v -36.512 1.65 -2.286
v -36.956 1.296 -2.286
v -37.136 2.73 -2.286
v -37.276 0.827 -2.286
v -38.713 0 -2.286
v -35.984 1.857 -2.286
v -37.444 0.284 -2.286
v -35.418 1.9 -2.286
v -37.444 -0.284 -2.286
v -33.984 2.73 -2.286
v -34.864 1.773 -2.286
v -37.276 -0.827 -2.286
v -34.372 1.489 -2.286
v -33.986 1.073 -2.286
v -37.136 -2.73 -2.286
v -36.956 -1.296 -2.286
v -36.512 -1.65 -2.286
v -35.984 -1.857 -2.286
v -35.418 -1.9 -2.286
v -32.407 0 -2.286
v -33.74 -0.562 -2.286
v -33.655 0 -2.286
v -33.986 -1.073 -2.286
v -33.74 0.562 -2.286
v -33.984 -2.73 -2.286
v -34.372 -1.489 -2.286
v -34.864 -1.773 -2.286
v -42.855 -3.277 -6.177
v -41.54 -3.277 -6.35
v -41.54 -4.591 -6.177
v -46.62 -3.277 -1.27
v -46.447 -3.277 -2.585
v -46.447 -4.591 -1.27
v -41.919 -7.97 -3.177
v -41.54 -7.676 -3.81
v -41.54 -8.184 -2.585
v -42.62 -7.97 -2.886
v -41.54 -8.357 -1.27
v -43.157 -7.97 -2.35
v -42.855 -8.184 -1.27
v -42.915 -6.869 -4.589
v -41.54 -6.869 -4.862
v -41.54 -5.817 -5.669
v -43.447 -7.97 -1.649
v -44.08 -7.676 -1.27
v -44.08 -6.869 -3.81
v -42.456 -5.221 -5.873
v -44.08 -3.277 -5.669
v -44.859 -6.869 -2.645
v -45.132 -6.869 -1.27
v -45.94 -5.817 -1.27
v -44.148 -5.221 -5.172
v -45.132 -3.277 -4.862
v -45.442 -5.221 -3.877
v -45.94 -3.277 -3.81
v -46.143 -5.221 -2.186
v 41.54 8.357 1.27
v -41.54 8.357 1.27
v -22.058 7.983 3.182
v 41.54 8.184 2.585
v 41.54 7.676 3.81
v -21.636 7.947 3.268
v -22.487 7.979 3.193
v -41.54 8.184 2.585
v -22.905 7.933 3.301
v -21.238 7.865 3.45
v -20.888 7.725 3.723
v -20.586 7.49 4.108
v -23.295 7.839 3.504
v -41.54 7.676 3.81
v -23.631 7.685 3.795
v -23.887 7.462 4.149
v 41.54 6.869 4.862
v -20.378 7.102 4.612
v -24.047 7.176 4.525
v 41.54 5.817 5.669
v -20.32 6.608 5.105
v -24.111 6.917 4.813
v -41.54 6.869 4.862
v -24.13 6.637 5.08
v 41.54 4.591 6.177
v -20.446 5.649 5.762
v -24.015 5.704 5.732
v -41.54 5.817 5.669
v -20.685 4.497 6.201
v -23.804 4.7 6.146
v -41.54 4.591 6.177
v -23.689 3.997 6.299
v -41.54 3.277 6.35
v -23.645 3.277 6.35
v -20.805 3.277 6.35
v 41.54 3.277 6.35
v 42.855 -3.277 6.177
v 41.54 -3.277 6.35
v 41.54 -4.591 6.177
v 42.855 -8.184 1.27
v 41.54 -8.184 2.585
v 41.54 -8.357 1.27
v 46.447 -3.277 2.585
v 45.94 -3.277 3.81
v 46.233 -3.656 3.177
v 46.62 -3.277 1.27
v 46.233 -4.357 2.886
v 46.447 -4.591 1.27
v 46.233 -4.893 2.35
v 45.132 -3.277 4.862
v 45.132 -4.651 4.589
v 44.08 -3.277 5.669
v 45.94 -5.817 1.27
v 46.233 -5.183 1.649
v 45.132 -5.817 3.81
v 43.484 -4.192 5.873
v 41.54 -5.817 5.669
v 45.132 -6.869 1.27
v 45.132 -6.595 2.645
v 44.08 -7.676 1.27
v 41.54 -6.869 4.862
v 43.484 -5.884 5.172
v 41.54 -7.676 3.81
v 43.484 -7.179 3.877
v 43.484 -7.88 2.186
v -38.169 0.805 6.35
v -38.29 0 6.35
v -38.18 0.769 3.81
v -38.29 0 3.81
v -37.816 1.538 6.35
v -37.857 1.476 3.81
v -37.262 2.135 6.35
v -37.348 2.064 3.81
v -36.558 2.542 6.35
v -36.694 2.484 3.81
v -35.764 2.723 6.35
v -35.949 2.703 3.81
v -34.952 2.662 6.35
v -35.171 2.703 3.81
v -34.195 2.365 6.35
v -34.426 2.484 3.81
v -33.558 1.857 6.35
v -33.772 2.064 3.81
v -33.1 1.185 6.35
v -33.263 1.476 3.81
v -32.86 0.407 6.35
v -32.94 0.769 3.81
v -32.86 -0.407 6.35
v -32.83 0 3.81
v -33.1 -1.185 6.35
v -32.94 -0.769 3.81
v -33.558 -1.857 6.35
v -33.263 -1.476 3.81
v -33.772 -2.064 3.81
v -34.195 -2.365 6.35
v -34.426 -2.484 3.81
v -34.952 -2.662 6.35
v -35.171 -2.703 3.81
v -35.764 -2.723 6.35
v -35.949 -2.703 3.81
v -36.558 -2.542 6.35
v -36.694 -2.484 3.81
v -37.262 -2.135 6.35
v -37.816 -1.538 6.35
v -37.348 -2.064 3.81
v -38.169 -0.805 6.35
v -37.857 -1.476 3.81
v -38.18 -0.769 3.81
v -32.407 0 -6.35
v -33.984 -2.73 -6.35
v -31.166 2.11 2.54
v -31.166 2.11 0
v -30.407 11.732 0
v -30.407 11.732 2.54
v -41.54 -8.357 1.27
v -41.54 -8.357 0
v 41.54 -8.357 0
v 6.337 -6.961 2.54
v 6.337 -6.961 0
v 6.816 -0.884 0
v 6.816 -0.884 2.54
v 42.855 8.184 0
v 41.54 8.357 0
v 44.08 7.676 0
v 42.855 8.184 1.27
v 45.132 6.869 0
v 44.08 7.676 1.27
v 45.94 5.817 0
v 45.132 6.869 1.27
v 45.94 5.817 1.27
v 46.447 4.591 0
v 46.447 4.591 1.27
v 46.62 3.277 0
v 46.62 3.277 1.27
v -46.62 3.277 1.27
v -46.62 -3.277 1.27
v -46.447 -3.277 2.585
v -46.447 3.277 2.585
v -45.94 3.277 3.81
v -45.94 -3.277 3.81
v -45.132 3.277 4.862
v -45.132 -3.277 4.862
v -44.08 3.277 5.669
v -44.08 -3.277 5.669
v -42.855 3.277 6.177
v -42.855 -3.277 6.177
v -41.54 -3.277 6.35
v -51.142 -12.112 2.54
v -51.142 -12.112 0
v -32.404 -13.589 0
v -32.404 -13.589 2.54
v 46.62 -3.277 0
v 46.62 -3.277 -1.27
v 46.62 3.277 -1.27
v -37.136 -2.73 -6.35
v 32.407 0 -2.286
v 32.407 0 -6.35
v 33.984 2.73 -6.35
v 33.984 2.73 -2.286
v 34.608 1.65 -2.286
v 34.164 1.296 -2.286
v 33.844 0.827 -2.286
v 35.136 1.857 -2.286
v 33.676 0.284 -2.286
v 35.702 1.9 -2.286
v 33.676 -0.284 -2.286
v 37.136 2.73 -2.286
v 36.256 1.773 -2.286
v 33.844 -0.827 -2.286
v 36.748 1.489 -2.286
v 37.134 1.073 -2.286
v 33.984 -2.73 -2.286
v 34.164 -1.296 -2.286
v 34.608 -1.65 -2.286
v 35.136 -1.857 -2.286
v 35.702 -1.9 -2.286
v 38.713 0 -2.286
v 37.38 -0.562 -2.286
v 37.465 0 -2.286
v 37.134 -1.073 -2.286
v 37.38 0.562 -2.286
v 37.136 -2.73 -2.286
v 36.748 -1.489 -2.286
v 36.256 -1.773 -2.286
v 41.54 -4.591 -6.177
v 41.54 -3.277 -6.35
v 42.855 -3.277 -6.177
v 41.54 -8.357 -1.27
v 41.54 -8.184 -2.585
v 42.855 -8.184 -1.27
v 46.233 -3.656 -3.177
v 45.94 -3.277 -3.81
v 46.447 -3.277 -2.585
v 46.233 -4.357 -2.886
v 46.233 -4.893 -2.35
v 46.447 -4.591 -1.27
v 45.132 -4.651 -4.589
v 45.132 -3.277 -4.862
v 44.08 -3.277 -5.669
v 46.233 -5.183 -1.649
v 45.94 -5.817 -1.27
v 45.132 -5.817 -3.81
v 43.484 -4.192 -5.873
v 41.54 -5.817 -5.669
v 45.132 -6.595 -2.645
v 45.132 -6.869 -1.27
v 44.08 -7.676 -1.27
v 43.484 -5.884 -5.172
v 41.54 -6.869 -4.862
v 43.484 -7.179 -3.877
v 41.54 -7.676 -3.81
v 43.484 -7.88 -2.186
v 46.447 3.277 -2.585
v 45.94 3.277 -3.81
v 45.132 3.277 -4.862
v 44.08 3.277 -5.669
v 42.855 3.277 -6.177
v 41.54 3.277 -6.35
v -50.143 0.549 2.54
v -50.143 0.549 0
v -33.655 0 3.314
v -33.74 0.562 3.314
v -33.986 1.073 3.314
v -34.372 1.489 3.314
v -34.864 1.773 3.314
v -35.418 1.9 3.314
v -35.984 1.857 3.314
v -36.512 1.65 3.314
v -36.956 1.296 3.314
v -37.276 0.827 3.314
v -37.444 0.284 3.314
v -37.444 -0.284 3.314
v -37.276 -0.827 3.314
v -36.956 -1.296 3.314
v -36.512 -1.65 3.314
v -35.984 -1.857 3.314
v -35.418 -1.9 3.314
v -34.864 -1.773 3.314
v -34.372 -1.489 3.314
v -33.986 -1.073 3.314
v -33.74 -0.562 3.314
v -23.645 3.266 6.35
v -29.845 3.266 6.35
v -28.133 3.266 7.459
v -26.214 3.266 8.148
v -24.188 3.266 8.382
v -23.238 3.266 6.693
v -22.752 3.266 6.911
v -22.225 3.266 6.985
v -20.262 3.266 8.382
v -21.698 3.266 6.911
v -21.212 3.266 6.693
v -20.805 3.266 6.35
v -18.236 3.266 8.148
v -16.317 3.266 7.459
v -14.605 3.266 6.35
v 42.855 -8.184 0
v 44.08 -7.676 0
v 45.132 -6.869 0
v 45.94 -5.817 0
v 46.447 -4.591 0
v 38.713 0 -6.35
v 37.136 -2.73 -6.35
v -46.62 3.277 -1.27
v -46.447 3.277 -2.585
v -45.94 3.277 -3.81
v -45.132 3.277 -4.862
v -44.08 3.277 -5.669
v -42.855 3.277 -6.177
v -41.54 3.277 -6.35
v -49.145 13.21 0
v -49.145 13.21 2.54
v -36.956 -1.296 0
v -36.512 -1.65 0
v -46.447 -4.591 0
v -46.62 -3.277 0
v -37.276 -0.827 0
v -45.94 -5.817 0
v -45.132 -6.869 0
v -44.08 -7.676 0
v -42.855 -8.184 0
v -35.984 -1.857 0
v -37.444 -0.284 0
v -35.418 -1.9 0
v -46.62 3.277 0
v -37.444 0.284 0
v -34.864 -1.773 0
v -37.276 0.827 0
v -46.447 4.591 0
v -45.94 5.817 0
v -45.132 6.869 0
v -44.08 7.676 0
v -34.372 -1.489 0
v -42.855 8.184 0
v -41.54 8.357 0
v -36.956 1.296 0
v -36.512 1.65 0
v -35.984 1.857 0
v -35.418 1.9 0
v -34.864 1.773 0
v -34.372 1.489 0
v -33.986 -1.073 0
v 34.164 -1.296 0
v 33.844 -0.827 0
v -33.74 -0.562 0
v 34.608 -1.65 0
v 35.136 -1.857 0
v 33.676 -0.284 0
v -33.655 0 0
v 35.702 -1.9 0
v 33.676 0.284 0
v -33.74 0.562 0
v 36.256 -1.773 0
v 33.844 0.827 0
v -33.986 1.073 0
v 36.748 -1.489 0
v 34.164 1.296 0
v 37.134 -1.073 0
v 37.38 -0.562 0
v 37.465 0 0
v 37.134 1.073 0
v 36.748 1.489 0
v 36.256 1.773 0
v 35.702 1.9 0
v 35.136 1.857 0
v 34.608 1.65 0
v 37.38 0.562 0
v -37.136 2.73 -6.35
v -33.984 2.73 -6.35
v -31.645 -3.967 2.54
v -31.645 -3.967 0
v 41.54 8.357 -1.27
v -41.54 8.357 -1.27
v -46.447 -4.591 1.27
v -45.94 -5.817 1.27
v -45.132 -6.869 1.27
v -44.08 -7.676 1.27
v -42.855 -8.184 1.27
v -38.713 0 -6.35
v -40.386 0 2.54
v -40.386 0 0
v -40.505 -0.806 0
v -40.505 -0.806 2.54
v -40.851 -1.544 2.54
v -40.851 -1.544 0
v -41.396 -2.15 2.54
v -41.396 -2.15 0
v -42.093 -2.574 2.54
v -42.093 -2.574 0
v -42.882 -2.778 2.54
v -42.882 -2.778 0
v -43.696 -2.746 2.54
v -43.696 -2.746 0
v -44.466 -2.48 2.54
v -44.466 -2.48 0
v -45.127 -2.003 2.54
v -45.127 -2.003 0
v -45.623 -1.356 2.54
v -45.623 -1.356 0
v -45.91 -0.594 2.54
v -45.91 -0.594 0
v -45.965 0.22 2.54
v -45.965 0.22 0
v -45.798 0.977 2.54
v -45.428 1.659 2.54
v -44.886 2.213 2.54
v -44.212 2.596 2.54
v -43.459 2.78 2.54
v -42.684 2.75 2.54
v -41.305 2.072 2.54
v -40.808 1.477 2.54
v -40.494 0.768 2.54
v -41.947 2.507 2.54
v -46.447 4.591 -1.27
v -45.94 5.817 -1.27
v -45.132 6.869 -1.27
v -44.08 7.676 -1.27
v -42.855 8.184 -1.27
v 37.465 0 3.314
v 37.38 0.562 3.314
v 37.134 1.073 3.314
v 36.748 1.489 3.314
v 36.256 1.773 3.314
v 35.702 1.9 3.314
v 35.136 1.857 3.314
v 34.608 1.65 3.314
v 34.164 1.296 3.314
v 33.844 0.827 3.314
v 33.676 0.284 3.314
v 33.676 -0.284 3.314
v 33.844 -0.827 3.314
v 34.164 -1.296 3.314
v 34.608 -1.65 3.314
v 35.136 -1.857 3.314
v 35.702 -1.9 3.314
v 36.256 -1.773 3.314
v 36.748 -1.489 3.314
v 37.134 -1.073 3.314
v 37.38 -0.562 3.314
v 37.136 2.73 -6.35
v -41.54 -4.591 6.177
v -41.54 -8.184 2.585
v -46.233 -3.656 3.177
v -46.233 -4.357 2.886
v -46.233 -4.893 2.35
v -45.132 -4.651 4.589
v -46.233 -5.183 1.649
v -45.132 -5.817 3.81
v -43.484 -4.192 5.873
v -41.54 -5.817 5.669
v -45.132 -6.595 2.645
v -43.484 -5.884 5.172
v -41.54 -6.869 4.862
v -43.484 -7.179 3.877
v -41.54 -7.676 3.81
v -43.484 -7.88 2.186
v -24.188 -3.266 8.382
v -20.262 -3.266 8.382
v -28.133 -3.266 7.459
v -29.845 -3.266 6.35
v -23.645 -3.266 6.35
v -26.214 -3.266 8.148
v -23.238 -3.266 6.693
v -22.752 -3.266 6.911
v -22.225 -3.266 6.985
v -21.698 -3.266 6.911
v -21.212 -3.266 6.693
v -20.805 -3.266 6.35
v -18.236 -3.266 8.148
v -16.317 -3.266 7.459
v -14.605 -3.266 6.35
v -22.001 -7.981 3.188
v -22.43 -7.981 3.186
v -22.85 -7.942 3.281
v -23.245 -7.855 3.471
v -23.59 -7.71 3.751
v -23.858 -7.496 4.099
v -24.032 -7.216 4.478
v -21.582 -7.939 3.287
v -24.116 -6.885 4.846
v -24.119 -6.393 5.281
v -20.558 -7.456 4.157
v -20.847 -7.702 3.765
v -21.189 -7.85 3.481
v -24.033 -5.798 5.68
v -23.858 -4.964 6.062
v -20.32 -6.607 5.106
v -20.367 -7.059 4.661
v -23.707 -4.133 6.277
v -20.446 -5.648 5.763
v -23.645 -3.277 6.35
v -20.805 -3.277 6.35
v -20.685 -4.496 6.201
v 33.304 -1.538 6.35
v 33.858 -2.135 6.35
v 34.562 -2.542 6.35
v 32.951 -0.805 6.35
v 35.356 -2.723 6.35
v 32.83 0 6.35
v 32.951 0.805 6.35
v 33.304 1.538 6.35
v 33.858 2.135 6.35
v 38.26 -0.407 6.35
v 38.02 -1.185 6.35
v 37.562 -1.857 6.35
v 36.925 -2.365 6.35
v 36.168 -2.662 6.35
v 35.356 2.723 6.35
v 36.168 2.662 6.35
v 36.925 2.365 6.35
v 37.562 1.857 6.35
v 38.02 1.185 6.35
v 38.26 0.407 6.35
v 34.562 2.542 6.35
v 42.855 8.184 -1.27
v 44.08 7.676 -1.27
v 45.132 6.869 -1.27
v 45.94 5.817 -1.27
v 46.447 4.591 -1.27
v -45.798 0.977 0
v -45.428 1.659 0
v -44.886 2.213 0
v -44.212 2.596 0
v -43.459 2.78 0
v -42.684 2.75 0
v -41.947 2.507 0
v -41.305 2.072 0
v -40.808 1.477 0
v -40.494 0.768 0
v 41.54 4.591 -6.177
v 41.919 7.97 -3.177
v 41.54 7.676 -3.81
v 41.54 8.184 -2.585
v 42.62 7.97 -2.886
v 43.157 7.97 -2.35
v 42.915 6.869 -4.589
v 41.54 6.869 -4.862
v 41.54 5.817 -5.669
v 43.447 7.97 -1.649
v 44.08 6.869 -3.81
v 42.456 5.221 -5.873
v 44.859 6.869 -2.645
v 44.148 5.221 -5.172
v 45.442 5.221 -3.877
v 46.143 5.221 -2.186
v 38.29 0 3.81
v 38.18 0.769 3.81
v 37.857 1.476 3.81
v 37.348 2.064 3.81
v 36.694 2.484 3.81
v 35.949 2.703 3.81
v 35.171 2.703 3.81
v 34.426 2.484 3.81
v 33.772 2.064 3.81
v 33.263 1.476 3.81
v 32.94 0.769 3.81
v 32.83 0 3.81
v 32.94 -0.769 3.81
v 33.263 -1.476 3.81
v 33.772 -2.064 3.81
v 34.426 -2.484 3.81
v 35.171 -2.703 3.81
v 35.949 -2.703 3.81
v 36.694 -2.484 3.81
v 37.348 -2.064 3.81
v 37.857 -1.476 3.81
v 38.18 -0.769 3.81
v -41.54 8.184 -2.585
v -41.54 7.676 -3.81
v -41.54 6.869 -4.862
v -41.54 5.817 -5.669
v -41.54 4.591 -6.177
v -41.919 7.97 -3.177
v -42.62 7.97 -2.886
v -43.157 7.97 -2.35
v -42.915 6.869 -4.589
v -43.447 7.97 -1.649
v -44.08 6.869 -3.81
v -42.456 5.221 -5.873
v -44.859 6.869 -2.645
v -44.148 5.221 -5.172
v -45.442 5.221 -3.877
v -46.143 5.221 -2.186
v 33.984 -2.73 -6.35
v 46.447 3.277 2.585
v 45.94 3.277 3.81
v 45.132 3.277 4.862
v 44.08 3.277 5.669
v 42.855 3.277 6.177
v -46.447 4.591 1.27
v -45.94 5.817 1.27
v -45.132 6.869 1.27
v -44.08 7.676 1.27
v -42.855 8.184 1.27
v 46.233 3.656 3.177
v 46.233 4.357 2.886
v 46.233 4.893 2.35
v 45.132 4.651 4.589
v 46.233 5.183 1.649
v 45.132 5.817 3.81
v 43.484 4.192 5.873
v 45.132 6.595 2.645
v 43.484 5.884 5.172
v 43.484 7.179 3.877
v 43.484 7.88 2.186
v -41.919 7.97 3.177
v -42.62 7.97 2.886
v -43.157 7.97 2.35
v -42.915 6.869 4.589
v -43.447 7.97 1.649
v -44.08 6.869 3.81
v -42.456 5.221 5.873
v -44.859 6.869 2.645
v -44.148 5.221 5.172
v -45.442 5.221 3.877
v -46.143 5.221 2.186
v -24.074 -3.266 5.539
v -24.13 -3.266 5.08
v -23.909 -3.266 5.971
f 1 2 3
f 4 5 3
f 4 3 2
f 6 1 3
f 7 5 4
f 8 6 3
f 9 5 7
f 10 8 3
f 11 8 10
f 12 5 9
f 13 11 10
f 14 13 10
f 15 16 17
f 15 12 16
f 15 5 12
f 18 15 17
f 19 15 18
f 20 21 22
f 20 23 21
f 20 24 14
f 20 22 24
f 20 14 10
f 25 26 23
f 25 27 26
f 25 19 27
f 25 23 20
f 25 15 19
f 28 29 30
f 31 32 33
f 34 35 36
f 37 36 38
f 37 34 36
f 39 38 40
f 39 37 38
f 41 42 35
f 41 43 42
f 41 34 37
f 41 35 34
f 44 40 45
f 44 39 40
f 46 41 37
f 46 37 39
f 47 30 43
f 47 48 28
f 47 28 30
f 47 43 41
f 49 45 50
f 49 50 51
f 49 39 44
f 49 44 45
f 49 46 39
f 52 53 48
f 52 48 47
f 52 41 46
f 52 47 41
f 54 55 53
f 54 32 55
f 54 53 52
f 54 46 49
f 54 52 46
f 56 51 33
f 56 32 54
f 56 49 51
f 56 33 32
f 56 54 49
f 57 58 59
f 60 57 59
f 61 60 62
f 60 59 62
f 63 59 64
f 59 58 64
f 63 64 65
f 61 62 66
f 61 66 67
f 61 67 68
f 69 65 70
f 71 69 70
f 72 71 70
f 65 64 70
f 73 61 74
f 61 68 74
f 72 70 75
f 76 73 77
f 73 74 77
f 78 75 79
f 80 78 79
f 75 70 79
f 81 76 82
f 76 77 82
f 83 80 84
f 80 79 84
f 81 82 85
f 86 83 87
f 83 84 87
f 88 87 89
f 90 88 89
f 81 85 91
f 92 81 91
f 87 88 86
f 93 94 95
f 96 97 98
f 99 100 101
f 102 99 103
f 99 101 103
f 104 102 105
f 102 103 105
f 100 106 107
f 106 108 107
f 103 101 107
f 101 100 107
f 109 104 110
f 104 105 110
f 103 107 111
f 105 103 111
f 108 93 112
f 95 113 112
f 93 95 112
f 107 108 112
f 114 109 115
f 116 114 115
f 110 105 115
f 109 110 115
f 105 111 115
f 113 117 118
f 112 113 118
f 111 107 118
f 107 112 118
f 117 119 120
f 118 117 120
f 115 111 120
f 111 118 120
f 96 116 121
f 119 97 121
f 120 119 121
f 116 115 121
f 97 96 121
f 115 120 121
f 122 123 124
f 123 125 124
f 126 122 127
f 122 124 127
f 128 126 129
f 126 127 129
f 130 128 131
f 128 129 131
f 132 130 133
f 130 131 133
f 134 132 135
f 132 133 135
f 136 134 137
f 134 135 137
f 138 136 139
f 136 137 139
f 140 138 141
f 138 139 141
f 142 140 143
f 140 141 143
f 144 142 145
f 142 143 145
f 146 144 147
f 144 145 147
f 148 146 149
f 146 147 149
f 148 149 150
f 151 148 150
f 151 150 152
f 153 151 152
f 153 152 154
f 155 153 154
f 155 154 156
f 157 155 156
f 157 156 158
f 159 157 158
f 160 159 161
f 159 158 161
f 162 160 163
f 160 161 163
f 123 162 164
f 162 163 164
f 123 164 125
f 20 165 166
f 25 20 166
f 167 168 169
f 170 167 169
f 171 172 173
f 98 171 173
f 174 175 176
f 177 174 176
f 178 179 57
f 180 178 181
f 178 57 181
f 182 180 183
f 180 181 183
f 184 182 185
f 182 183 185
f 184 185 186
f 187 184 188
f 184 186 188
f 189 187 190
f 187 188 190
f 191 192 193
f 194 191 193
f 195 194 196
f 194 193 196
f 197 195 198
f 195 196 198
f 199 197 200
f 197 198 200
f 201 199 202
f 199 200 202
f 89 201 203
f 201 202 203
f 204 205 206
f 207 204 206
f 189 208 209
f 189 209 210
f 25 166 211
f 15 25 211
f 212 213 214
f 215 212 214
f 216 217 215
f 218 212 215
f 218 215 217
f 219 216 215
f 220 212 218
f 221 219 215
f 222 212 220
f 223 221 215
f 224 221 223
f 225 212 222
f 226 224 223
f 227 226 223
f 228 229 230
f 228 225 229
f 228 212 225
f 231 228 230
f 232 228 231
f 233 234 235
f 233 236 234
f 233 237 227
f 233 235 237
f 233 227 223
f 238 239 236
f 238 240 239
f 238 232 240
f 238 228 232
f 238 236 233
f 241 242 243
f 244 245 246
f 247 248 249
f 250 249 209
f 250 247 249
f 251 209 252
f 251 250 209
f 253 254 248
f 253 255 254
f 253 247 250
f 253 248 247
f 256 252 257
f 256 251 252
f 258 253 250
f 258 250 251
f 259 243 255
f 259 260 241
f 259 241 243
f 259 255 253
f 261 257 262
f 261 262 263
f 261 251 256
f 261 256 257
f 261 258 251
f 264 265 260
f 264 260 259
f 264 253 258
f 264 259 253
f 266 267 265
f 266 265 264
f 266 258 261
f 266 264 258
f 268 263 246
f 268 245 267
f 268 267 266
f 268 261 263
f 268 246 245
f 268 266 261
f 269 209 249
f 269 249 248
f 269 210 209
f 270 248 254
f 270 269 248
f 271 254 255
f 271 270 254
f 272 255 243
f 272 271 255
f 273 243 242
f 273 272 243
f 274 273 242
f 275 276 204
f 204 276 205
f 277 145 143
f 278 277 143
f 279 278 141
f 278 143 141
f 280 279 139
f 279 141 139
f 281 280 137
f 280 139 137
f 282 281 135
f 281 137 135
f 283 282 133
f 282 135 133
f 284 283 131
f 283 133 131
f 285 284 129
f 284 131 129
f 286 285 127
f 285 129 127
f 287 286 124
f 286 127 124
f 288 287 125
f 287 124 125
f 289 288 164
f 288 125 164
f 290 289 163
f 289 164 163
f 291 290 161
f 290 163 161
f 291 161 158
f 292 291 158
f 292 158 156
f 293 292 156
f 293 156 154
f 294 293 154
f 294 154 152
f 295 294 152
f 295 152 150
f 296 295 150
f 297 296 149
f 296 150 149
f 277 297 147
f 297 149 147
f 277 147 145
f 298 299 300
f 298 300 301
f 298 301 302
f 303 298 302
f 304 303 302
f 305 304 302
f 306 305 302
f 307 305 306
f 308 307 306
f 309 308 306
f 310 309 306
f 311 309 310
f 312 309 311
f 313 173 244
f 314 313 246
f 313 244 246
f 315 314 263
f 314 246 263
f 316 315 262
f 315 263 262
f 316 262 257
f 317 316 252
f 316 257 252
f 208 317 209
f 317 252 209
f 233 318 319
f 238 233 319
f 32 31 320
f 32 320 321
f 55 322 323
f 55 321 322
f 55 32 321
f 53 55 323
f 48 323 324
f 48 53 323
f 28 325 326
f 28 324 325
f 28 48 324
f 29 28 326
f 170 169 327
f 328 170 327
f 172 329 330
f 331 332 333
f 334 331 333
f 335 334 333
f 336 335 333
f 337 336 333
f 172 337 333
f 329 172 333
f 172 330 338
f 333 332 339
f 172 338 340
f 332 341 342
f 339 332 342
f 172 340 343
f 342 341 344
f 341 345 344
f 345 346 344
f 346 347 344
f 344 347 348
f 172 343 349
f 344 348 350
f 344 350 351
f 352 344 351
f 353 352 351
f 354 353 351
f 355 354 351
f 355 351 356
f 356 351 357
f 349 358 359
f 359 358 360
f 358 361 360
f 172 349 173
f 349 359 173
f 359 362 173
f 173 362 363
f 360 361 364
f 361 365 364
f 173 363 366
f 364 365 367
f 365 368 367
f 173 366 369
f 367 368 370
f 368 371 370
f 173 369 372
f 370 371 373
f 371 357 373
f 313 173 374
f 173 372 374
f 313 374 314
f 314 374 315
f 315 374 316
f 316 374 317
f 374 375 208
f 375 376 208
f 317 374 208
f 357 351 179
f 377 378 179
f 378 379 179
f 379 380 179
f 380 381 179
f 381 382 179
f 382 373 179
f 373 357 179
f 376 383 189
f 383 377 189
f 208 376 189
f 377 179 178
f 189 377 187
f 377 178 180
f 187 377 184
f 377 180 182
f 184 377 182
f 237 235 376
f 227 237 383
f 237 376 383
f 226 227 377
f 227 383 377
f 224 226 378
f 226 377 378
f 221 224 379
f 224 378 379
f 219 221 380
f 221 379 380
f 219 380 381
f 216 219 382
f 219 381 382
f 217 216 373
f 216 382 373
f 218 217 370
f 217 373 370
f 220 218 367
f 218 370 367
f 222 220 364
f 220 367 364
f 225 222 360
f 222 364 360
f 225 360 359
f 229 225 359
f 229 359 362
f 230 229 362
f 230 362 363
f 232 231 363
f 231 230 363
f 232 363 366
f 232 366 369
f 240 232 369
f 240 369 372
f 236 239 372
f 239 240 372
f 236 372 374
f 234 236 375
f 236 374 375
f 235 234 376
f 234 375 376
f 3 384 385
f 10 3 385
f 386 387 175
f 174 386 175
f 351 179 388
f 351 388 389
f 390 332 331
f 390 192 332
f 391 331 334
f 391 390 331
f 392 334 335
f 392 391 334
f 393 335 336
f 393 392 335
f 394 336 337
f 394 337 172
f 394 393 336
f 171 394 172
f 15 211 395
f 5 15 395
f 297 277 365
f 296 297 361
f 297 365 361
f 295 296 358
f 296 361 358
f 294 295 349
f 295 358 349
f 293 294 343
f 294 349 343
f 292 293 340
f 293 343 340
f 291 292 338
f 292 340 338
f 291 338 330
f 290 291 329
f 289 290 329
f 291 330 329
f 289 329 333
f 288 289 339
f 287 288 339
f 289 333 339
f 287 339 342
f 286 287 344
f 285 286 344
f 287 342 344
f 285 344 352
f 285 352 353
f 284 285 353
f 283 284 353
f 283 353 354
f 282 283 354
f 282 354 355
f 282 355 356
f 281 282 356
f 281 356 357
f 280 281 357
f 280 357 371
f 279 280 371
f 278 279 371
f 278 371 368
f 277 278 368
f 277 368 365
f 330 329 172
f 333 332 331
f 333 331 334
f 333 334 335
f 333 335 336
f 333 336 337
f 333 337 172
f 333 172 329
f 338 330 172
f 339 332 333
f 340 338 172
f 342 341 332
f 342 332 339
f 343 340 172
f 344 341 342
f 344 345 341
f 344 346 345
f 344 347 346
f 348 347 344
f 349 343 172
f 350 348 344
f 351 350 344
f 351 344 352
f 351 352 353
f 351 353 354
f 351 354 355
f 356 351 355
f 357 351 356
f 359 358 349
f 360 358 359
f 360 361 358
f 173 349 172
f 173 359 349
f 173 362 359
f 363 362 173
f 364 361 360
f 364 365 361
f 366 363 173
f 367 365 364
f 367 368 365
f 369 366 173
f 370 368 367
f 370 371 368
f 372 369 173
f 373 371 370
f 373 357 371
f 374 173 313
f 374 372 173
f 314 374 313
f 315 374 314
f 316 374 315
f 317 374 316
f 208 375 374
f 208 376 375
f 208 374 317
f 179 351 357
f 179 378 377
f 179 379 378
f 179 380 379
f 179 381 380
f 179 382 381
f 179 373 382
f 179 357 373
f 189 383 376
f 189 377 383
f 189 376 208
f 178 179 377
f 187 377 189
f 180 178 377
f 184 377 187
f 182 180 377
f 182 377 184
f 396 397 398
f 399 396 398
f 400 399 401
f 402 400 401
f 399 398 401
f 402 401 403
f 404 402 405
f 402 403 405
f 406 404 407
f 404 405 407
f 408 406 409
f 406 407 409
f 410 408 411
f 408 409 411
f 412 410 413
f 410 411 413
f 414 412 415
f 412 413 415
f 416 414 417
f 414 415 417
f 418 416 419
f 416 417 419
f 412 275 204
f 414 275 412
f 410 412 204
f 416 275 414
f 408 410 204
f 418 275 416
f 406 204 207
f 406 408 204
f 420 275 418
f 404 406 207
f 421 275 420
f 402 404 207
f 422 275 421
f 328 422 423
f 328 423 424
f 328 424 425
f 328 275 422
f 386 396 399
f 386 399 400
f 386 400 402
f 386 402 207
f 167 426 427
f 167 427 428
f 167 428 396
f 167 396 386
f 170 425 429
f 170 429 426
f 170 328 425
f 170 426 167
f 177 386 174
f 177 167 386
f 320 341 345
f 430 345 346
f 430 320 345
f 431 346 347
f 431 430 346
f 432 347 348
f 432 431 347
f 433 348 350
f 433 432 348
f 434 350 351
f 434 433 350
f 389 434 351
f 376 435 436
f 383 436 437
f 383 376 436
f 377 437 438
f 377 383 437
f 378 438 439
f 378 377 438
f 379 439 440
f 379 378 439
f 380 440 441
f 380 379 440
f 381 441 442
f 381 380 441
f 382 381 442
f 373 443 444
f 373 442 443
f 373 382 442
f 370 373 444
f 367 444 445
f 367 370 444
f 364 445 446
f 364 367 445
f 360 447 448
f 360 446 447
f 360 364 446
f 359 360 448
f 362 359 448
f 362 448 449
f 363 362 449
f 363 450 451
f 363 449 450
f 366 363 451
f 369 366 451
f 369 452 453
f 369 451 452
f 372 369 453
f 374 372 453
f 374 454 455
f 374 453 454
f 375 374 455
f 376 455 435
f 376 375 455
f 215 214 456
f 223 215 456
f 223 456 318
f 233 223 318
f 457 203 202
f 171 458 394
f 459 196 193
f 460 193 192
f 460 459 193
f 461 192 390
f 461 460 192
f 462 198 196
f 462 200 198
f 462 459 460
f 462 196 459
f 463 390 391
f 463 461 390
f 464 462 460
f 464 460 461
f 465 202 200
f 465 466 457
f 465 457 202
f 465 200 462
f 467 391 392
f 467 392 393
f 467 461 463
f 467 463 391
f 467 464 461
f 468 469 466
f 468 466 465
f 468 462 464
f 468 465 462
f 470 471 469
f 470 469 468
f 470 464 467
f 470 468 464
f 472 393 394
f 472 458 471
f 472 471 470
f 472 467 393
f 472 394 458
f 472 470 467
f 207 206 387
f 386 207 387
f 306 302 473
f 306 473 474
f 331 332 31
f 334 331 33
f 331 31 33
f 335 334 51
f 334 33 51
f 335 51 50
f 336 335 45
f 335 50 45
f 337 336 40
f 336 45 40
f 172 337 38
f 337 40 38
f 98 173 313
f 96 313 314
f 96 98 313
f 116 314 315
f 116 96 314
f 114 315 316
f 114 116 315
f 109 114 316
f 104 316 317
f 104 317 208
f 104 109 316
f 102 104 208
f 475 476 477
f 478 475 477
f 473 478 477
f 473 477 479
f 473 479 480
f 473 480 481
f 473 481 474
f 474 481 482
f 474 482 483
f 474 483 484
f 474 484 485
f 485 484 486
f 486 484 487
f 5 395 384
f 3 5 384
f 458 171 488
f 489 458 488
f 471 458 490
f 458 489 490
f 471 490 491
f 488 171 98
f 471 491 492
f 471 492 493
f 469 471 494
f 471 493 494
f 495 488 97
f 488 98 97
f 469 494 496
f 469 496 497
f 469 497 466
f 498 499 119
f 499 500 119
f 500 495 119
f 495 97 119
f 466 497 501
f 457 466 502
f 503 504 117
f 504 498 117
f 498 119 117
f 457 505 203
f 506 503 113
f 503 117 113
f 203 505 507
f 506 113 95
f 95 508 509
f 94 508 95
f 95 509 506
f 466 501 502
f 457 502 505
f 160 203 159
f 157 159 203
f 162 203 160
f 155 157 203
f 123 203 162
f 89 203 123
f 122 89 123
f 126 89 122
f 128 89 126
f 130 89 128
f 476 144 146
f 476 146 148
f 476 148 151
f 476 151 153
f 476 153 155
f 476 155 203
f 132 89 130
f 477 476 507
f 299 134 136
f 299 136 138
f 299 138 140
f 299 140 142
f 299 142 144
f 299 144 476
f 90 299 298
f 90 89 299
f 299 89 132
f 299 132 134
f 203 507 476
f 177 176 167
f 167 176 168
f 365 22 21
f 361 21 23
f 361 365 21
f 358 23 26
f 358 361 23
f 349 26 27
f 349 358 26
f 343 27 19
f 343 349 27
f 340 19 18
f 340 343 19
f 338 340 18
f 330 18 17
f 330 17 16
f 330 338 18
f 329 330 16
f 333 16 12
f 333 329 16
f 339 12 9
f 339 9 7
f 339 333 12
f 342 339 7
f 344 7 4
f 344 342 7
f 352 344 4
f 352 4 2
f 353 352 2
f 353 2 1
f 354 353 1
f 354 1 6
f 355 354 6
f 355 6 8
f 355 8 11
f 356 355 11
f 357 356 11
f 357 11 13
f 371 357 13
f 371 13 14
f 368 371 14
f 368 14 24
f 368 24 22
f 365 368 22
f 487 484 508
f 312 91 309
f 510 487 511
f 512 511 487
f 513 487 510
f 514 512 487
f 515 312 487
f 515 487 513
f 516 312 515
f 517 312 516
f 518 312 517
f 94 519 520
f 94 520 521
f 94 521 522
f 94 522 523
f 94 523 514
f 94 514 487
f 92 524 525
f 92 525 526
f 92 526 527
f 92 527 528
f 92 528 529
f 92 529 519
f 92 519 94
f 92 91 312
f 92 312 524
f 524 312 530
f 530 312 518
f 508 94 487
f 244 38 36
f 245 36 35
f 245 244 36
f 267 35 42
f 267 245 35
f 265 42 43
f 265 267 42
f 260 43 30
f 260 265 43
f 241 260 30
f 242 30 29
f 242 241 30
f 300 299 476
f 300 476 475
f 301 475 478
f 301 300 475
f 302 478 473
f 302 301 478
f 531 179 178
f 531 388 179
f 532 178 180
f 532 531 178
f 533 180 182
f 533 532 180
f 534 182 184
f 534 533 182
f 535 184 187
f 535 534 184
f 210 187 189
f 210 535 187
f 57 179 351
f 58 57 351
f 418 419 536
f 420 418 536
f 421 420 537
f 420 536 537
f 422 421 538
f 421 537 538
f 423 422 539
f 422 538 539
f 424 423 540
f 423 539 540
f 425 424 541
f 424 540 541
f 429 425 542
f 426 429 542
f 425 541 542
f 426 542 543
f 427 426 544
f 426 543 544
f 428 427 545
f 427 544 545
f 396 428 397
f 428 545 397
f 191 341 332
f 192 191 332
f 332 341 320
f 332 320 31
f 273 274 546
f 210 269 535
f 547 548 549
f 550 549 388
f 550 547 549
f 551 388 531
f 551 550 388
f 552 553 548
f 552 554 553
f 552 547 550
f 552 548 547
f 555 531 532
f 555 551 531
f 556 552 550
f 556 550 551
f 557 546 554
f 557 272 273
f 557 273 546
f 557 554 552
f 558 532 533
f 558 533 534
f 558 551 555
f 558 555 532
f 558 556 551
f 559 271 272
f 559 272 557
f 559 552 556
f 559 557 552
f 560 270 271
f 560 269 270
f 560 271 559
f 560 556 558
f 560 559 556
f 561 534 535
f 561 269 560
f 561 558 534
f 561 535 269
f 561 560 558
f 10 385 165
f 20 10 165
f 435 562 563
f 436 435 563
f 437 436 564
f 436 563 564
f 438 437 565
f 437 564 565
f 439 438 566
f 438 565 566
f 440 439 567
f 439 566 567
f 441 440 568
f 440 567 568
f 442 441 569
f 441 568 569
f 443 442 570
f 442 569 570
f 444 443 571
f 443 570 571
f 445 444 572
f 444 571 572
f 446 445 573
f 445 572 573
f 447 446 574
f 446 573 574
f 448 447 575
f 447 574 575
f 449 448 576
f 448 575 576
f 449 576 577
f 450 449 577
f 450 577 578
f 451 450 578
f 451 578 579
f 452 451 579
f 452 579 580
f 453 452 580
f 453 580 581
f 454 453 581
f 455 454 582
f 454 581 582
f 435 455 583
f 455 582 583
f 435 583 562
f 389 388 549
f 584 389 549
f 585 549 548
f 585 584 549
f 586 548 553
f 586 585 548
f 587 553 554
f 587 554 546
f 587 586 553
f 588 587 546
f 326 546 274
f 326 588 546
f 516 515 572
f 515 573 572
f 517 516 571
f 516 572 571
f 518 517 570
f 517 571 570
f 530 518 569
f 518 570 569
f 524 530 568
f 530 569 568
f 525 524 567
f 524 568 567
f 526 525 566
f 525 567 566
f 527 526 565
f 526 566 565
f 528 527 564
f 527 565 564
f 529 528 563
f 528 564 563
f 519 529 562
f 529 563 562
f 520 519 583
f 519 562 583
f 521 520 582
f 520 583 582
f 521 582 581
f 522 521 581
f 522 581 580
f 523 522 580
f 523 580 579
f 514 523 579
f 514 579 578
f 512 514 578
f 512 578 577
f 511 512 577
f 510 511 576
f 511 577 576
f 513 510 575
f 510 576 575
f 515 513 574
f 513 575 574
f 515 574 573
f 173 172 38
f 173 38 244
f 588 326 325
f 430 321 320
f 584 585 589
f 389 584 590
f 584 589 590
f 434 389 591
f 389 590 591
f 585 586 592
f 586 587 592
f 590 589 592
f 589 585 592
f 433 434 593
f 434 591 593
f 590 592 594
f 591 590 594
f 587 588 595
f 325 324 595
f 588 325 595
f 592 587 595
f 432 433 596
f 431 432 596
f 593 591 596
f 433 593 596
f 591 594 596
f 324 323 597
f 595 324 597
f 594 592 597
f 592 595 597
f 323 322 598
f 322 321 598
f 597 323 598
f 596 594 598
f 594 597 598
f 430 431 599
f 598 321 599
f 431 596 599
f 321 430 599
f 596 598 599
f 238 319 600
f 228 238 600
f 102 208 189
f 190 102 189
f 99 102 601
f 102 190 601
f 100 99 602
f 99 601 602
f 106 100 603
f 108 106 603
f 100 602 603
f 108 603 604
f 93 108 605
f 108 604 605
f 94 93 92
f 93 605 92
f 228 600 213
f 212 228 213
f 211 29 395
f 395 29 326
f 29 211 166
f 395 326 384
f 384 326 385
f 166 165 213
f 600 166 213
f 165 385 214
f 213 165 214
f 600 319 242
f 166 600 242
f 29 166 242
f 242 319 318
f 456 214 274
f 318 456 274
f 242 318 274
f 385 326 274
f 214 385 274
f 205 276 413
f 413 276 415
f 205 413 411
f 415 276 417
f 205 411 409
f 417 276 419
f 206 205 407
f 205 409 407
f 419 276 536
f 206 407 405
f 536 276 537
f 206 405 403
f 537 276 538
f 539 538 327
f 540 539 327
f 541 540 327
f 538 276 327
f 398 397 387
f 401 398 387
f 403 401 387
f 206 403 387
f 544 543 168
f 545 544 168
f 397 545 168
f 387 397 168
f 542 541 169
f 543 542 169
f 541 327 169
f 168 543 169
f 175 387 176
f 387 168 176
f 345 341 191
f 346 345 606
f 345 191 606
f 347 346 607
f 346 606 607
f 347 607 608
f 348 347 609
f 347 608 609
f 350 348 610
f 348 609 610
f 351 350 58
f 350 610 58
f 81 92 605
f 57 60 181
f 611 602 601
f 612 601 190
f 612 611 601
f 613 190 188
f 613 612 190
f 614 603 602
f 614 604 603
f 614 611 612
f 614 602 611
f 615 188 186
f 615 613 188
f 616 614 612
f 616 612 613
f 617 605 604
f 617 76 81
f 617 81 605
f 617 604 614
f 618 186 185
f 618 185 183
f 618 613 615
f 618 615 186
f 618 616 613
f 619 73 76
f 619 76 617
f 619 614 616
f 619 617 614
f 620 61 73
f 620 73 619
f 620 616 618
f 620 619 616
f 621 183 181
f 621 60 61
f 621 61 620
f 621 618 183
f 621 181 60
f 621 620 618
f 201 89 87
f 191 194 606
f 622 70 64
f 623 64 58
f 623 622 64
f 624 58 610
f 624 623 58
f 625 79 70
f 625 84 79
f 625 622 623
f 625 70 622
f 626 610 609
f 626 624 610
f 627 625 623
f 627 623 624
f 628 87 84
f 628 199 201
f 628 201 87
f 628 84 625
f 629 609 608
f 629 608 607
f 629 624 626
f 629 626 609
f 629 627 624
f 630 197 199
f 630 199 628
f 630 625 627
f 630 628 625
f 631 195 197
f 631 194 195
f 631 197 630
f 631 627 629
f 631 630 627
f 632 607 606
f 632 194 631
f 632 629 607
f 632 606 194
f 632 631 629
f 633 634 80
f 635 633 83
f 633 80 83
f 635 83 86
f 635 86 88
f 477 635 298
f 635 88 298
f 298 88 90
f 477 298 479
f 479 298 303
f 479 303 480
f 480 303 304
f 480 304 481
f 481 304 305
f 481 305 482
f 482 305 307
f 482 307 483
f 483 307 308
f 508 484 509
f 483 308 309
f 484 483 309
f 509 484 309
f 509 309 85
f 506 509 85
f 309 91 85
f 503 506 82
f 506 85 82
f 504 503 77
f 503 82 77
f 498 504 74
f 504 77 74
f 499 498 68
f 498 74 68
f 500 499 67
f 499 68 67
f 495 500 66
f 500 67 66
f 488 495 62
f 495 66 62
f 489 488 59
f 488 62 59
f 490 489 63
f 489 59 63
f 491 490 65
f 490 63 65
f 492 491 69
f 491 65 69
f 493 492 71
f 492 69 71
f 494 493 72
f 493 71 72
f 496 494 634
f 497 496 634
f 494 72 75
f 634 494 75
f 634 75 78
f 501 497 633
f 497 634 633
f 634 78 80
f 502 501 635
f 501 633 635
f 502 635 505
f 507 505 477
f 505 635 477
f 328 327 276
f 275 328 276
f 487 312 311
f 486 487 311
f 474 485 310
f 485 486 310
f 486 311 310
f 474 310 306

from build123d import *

# Parameters (mm, degrees)
F1_DEPTH    = 2.54
F2_R        = 1.905
F3_DEPTH    = 6.35
F4_DEPTH    = 6.35
F5_R        = 5.08
F6_R        = 5.08
F7_W        = 15.24
F7_H        = 6.5325613847
F8_DEPTH    = 2.032
F9_T1_DEPTH = 34.8168043479
F11_D       = 3.81
F11_DEPTH   = 5.0913193076
F12_D       = 3.81
F14_D       = 5.461
F14_DEPTH   = 2.54
F14_TIP     = 1.6406499203
F15_R       = 1.905
F16_DEPTH   = 4.064


# Not quite as in the source:
# - a fillet or chamfer that OpenCascade refuses, or shapes differently, is made with other operations: its cross-section is extruded or revolved along the edge and cut away or added
# - a feature of the source that left no trace in its solid (it failed there, or was rolled back) is left out


with BuildPart() as f1:
    # F0 (on Top) → F1 (new body)
    with BuildSketch(Plane.XY):
        Polygon((-30.4073522295, 11.7323991549), (-49.1452058091, 13.2097140262), (-50.143391533, 0.5490021481), (-51.1415772568, -12.11170973), (-32.4037236772, -13.5890246013), (-31.6451025271, -3.9668835739), (6.3370331073, -6.9614407455), (6.8161622547, -0.884299044), (-31.1659733796, 2.1102581276), align=None)
        with BuildLine():
            ThreePointArc((-40.386, 0), (-43.2898854466, -2.7918383171), (-45.9653566132, 0.2196008592))
            ThreePointArc((-45.9653566132, 0.2196008592), (-43.0701145534, 2.7918383171), (-40.386, 0))
        make_face(mode=Mode.SUBTRACT)
    extrude(amount=F1_DEPTH)


with BuildPart() as f3:
    # F2 (on Top) → F3 (new body)
    with BuildSketch(Plane.XY):
        Polygon((-46.6201489315, 8.3566), (-46.6201489315, 0), (-46.6201489315, -8.3566), (0, -8.3566), (46.6201489315, -8.3566), (46.6201489315, 0), (46.6201489315, 8.3566), (0, 8.3566), align=None)
        with BuildLine():
            ThreePointArc((-37.465, 0), (-35.56, 1.905), (-33.655, 0))
            ThreePointArc((-33.655, 0), (-35.56, -1.905), (-37.465, 0))
        make_face(mode=Mode.SUBTRACT)
        with Locations((35.56, 0)):
            Circle(F2_R, mode=Mode.SUBTRACT)
    extrude(amount=F3_DEPTH)

    # F5
    f5_edges = [f3.edges().sort_by_distance(p)[0] for p in [
        (0, -8.3566, 6.35),
        (-46.620149, 0, 6.35),
        (0, 8.3566, 6.35),
        (46.620149, 0, 6.35),
        (-46.620149, -8.3566, 3.175),
        (-46.620149, 8.3566, 3.175),
        (46.620149, -8.3566, 3.175),
        (46.620149, 8.3566, 3.175),
    ]]
    fillet(f5_edges, radius=F5_R)

    # F7 (on face) → F8 (join)
    with BuildSketch(Plane.XY.offset(6.35)):
        with Locations((-22.225, 0)):
            Rectangle(F7_W, F7_H)
    extrude(amount=F8_DEPTH)

    # F9: fillet of radius 8.89 on 2 edges, made by hand

    # F9_s2 → F9_t1 (cut)
    with BuildSketch(Plane.XZ.offset(-17.408402174)):
        with BuildLine():
            ThreePointArc((-29.845, 6.35), (-27.1935199372, 7.8585918987), (-24.1881514074, 8.382))
            Line((-24.1881514074, 8.382), (-29.845, 8.382))
            Line((-29.845, 8.382), (-29.845, 6.35))
        make_face()
        with BuildLine():
            ThreePointArc((-14.605, 6.35), (-17.2564800628, 7.8585918987), (-20.2618485926, 8.382))
            Line((-20.2618485926, 8.382), (-14.605, 8.382))
            Line((-14.605, 8.382), (-14.605, 6.35))
        make_face()
    extrude(amount=F9_T1_DEPTH, mode=Mode.SUBTRACT)

    # F11 (through all, one way)
    with BuildSketch(Plane(origin=(0, -3.2662806924, 0), x_dir=(1, 0, 0), z_dir=(0, 1, 0))):
        with Locations((-22.225, -5.08)):
            Circle(F11_D / 2)
    extrude(amount=-F11_DEPTH, mode=Mode.SUBTRACT)

    # F12 (through all)
    with Locations(Plane.XZ.offset(3.2662806924)):
        with Locations((-22.225, 5.08)):
            Hole(F12_D / 2)

    # F14
    with Locations(Plane.XY.offset(6.35)):
        with Locations((35.56, 0), (-35.56, 0)):
            Hole(F14_D / 2, depth=F14_DEPTH)
            with Locations((0, 0, -(F14_DEPTH + F14_TIP / 2))):  # 118° drill point
                Cone(0, F14_D / 2, F14_TIP, mode=Mode.SUBTRACT)


with BuildPart() as f4:
    # F2 (on Top) → F4 (new body)
    with BuildSketch(Plane.XY):
        Polygon((-46.6201489315, 8.3566), (-46.6201489315, 0), (-46.6201489315, -8.3566), (0, -8.3566), (46.6201489315, -8.3566), (46.6201489315, 0), (46.6201489315, 8.3566), (0, 8.3566), align=None)
        with BuildLine():
            ThreePointArc((-37.465, 0), (-35.56, 1.905), (-33.655, 0))
            ThreePointArc((-33.655, 0), (-35.56, -1.905), (-37.465, 0))
        make_face(mode=Mode.SUBTRACT)
        with Locations((35.56, 0)):
            Circle(F2_R, mode=Mode.SUBTRACT)
    extrude(amount=-F4_DEPTH)

    # F6
    f6_edges = [f4.edges().sort_by_distance(p)[0] for p in [
        (-46.620149, 0, -6.35),
        (0, -8.3566, -6.35),
        (46.620149, 0, -6.35),
        (0, 8.3566, -6.35),
        (46.620149, -8.3566, -3.175),
        (46.620149, 8.3566, -3.175),
        (-46.620149, -8.3566, -3.175),
        (-46.620149, 8.3566, -3.175),
    ]]
    fillet(f6_edges, radius=F6_R)

    # F15 (on face) → F16 (cut)
    with BuildSketch(Plane(origin=(0, 0, -6.35), x_dir=(1, 0, 0), z_dir=(0, 0, -1))):
        Polygon((-33.98354509, -2.7305), (-32.40709018, 0), (-33.98354509, 2.7305), (-37.13645491, 2.7305), (-38.71290982, 0), (-37.13645491, -2.7305), align=None)
        with Locations((-35.56, 0)):
            Circle(F15_R, mode=Mode.SUBTRACT)
        Polygon((37.13645491, -2.7305), (38.71290982, 0), (37.13645491, 2.7305), (33.98354509, 2.7305), (32.40709018, 0), (33.98354509, -2.7305), align=None)
        with Locations((35.56, 0)):
            Circle(F15_R, mode=Mode.SUBTRACT)
    extrude(amount=-F16_DEPTH, mode=Mode.SUBTRACT)


solid = Compound([f1.part, f3.part, f4.part])
